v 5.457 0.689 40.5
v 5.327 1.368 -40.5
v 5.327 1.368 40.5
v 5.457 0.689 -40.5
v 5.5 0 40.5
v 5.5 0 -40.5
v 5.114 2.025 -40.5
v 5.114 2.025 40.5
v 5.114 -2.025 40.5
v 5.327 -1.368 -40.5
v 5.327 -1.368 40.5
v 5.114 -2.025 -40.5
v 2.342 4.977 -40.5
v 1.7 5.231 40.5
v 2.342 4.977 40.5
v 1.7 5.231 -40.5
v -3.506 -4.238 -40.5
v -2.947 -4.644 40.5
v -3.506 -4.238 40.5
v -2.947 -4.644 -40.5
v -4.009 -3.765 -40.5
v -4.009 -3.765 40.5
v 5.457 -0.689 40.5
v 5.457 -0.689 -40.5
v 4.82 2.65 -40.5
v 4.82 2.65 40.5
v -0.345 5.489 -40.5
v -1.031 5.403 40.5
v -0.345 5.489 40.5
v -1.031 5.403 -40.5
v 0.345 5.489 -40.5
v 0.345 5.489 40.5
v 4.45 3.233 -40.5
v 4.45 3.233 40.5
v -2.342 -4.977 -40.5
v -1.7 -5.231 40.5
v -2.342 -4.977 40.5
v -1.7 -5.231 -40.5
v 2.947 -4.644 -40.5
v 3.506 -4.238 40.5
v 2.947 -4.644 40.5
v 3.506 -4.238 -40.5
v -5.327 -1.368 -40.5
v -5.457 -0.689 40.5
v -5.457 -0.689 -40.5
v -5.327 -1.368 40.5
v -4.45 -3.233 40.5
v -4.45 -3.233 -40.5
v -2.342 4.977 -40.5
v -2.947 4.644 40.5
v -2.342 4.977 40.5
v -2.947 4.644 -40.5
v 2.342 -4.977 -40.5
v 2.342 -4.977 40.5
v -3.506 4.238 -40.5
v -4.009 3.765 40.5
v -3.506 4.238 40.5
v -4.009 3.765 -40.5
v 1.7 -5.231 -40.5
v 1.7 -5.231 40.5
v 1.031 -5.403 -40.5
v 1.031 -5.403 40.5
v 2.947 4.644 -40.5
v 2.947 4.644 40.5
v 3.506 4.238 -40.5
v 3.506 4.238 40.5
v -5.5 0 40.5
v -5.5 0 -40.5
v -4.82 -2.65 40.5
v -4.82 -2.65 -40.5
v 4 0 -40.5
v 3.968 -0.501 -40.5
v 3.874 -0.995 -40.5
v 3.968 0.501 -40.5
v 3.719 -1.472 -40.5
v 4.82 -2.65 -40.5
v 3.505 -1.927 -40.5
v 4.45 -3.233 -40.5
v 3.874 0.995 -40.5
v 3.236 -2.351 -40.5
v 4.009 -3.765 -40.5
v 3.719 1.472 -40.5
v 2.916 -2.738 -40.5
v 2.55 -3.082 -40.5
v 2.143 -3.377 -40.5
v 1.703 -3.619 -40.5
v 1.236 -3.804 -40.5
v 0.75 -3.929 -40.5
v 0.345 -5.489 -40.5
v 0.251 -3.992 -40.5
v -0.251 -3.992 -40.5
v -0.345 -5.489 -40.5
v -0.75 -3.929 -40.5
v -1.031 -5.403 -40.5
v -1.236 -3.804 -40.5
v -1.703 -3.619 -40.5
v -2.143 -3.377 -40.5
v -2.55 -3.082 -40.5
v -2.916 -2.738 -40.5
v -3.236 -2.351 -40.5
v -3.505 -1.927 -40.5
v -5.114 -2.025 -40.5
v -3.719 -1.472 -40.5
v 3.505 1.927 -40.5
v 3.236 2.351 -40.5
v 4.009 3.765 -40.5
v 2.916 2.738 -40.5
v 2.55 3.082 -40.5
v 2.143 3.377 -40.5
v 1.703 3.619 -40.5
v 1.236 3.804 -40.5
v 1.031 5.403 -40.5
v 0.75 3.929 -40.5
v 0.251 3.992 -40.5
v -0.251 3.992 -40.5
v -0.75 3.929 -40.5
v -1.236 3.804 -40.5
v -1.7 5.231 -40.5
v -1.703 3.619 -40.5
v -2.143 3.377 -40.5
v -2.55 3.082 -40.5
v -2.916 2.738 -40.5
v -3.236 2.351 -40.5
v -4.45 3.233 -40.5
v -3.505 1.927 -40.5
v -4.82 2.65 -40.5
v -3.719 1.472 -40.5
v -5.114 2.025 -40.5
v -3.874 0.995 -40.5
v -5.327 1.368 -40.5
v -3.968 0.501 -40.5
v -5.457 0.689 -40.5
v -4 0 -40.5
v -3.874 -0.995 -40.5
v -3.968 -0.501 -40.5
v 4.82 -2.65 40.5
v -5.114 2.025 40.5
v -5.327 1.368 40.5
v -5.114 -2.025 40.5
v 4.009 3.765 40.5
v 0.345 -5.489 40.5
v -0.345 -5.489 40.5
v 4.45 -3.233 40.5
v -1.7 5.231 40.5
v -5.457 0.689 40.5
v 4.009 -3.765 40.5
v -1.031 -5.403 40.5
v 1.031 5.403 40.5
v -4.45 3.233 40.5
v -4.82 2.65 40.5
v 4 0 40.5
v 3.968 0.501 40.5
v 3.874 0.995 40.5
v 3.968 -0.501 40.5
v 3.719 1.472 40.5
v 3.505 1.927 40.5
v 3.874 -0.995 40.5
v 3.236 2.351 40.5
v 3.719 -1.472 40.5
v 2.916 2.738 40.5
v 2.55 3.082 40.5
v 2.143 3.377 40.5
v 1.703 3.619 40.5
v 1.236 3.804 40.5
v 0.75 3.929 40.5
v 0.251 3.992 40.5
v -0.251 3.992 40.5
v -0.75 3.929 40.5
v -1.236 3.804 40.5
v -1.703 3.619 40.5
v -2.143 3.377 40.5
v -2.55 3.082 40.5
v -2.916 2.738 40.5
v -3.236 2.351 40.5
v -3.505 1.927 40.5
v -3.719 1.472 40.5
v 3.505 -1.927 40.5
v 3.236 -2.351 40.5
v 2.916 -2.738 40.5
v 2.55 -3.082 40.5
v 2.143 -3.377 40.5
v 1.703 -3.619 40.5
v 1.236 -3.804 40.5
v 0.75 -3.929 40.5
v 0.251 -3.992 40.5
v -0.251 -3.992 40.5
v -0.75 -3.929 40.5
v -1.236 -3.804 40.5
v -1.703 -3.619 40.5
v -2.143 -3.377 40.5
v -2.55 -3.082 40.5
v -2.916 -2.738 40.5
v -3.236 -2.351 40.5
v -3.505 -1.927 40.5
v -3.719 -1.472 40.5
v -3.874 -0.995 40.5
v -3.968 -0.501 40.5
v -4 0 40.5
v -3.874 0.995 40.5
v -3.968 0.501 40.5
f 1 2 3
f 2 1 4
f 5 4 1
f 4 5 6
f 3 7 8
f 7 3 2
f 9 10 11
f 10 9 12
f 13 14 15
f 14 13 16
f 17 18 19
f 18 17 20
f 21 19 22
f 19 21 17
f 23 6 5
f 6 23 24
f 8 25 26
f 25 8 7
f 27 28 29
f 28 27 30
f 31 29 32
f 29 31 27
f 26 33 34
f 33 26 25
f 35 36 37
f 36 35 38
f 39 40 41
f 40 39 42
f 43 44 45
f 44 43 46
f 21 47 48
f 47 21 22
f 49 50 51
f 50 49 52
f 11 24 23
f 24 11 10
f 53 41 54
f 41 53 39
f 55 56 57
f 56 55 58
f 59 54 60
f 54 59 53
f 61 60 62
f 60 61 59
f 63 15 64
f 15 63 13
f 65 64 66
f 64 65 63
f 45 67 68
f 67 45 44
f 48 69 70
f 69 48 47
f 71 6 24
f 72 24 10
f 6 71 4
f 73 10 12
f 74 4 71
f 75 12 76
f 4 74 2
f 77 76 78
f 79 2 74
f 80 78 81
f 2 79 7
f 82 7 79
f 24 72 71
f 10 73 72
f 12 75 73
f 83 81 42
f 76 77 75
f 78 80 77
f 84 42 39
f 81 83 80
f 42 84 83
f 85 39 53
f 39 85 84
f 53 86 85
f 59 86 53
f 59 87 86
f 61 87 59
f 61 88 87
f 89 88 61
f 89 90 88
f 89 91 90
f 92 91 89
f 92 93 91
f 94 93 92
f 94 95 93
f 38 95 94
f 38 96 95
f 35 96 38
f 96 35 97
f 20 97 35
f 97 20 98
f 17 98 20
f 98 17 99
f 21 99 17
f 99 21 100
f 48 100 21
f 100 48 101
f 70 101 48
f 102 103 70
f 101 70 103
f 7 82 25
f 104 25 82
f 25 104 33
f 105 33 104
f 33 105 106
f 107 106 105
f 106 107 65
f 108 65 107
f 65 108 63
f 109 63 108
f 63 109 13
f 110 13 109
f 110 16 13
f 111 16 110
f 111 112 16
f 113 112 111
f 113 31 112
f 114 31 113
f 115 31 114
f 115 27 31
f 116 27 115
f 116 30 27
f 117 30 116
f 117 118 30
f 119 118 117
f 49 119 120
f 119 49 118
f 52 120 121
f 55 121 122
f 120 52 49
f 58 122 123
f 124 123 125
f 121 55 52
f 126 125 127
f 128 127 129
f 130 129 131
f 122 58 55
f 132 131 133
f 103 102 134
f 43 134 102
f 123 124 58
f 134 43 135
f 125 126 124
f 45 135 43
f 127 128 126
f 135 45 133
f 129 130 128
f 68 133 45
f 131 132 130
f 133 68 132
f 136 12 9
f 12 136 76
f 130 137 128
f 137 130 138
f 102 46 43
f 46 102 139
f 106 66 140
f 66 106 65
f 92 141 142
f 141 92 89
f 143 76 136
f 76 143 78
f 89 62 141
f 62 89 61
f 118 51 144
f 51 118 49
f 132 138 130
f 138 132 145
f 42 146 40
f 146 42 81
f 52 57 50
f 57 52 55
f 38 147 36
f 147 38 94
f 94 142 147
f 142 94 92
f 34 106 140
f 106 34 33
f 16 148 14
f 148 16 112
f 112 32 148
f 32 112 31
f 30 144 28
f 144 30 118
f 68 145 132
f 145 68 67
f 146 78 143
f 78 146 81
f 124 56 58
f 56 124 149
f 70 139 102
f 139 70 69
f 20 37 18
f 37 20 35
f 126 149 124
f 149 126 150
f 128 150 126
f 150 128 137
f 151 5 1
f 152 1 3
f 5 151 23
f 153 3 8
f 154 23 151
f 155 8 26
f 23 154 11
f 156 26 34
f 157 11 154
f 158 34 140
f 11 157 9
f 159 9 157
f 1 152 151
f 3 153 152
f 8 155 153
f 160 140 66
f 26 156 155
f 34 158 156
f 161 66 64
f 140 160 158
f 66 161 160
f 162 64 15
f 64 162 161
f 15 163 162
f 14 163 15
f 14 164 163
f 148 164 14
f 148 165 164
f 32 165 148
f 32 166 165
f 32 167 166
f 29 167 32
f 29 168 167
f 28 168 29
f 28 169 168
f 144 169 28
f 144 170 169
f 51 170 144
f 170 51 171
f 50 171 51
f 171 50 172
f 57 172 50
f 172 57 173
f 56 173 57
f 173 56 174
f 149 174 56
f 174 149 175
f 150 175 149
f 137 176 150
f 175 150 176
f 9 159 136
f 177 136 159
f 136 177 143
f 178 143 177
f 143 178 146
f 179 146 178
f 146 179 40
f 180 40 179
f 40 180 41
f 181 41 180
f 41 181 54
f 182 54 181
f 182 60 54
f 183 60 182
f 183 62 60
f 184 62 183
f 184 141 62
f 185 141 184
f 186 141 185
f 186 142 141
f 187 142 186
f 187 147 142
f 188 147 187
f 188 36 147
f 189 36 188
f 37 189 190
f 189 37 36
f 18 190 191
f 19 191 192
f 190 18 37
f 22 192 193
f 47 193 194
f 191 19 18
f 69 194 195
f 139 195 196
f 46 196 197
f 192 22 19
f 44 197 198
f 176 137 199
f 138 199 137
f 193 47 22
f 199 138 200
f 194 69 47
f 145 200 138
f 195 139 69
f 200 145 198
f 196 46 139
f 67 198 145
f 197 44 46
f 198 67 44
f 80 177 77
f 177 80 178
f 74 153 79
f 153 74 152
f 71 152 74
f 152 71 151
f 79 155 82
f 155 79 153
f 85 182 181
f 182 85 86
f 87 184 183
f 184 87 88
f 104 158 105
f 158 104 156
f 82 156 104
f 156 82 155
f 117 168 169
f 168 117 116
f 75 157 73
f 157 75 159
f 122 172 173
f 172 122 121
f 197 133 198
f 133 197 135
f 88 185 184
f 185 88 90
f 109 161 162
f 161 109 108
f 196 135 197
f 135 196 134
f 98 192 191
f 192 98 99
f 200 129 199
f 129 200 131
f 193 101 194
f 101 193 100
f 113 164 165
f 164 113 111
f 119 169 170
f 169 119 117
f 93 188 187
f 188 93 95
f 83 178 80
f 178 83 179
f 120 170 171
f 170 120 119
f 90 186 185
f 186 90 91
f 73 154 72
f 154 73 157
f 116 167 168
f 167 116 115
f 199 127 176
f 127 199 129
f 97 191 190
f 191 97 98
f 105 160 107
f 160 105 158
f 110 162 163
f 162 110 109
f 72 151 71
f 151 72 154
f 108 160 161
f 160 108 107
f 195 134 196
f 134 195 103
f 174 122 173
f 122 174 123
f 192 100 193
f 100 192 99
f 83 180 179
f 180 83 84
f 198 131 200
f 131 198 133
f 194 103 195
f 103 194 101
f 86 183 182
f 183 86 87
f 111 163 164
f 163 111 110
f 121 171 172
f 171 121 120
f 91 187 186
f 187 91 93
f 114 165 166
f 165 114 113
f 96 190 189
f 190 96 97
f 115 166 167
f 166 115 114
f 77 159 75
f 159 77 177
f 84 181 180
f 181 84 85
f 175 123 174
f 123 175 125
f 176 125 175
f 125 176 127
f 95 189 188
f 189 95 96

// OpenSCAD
$fn = 50;


difference() {
	union() {
		translate(v = [0, 0, -40.5000000000]) {
			cylinder(h = 81, r = 5.5000000000);
		}
	}
	union() {
		translate(v = [0, 0, -100.0000000000]) {
			cylinder(h = 200, r = 4.0000000000);
		}
	}
}
